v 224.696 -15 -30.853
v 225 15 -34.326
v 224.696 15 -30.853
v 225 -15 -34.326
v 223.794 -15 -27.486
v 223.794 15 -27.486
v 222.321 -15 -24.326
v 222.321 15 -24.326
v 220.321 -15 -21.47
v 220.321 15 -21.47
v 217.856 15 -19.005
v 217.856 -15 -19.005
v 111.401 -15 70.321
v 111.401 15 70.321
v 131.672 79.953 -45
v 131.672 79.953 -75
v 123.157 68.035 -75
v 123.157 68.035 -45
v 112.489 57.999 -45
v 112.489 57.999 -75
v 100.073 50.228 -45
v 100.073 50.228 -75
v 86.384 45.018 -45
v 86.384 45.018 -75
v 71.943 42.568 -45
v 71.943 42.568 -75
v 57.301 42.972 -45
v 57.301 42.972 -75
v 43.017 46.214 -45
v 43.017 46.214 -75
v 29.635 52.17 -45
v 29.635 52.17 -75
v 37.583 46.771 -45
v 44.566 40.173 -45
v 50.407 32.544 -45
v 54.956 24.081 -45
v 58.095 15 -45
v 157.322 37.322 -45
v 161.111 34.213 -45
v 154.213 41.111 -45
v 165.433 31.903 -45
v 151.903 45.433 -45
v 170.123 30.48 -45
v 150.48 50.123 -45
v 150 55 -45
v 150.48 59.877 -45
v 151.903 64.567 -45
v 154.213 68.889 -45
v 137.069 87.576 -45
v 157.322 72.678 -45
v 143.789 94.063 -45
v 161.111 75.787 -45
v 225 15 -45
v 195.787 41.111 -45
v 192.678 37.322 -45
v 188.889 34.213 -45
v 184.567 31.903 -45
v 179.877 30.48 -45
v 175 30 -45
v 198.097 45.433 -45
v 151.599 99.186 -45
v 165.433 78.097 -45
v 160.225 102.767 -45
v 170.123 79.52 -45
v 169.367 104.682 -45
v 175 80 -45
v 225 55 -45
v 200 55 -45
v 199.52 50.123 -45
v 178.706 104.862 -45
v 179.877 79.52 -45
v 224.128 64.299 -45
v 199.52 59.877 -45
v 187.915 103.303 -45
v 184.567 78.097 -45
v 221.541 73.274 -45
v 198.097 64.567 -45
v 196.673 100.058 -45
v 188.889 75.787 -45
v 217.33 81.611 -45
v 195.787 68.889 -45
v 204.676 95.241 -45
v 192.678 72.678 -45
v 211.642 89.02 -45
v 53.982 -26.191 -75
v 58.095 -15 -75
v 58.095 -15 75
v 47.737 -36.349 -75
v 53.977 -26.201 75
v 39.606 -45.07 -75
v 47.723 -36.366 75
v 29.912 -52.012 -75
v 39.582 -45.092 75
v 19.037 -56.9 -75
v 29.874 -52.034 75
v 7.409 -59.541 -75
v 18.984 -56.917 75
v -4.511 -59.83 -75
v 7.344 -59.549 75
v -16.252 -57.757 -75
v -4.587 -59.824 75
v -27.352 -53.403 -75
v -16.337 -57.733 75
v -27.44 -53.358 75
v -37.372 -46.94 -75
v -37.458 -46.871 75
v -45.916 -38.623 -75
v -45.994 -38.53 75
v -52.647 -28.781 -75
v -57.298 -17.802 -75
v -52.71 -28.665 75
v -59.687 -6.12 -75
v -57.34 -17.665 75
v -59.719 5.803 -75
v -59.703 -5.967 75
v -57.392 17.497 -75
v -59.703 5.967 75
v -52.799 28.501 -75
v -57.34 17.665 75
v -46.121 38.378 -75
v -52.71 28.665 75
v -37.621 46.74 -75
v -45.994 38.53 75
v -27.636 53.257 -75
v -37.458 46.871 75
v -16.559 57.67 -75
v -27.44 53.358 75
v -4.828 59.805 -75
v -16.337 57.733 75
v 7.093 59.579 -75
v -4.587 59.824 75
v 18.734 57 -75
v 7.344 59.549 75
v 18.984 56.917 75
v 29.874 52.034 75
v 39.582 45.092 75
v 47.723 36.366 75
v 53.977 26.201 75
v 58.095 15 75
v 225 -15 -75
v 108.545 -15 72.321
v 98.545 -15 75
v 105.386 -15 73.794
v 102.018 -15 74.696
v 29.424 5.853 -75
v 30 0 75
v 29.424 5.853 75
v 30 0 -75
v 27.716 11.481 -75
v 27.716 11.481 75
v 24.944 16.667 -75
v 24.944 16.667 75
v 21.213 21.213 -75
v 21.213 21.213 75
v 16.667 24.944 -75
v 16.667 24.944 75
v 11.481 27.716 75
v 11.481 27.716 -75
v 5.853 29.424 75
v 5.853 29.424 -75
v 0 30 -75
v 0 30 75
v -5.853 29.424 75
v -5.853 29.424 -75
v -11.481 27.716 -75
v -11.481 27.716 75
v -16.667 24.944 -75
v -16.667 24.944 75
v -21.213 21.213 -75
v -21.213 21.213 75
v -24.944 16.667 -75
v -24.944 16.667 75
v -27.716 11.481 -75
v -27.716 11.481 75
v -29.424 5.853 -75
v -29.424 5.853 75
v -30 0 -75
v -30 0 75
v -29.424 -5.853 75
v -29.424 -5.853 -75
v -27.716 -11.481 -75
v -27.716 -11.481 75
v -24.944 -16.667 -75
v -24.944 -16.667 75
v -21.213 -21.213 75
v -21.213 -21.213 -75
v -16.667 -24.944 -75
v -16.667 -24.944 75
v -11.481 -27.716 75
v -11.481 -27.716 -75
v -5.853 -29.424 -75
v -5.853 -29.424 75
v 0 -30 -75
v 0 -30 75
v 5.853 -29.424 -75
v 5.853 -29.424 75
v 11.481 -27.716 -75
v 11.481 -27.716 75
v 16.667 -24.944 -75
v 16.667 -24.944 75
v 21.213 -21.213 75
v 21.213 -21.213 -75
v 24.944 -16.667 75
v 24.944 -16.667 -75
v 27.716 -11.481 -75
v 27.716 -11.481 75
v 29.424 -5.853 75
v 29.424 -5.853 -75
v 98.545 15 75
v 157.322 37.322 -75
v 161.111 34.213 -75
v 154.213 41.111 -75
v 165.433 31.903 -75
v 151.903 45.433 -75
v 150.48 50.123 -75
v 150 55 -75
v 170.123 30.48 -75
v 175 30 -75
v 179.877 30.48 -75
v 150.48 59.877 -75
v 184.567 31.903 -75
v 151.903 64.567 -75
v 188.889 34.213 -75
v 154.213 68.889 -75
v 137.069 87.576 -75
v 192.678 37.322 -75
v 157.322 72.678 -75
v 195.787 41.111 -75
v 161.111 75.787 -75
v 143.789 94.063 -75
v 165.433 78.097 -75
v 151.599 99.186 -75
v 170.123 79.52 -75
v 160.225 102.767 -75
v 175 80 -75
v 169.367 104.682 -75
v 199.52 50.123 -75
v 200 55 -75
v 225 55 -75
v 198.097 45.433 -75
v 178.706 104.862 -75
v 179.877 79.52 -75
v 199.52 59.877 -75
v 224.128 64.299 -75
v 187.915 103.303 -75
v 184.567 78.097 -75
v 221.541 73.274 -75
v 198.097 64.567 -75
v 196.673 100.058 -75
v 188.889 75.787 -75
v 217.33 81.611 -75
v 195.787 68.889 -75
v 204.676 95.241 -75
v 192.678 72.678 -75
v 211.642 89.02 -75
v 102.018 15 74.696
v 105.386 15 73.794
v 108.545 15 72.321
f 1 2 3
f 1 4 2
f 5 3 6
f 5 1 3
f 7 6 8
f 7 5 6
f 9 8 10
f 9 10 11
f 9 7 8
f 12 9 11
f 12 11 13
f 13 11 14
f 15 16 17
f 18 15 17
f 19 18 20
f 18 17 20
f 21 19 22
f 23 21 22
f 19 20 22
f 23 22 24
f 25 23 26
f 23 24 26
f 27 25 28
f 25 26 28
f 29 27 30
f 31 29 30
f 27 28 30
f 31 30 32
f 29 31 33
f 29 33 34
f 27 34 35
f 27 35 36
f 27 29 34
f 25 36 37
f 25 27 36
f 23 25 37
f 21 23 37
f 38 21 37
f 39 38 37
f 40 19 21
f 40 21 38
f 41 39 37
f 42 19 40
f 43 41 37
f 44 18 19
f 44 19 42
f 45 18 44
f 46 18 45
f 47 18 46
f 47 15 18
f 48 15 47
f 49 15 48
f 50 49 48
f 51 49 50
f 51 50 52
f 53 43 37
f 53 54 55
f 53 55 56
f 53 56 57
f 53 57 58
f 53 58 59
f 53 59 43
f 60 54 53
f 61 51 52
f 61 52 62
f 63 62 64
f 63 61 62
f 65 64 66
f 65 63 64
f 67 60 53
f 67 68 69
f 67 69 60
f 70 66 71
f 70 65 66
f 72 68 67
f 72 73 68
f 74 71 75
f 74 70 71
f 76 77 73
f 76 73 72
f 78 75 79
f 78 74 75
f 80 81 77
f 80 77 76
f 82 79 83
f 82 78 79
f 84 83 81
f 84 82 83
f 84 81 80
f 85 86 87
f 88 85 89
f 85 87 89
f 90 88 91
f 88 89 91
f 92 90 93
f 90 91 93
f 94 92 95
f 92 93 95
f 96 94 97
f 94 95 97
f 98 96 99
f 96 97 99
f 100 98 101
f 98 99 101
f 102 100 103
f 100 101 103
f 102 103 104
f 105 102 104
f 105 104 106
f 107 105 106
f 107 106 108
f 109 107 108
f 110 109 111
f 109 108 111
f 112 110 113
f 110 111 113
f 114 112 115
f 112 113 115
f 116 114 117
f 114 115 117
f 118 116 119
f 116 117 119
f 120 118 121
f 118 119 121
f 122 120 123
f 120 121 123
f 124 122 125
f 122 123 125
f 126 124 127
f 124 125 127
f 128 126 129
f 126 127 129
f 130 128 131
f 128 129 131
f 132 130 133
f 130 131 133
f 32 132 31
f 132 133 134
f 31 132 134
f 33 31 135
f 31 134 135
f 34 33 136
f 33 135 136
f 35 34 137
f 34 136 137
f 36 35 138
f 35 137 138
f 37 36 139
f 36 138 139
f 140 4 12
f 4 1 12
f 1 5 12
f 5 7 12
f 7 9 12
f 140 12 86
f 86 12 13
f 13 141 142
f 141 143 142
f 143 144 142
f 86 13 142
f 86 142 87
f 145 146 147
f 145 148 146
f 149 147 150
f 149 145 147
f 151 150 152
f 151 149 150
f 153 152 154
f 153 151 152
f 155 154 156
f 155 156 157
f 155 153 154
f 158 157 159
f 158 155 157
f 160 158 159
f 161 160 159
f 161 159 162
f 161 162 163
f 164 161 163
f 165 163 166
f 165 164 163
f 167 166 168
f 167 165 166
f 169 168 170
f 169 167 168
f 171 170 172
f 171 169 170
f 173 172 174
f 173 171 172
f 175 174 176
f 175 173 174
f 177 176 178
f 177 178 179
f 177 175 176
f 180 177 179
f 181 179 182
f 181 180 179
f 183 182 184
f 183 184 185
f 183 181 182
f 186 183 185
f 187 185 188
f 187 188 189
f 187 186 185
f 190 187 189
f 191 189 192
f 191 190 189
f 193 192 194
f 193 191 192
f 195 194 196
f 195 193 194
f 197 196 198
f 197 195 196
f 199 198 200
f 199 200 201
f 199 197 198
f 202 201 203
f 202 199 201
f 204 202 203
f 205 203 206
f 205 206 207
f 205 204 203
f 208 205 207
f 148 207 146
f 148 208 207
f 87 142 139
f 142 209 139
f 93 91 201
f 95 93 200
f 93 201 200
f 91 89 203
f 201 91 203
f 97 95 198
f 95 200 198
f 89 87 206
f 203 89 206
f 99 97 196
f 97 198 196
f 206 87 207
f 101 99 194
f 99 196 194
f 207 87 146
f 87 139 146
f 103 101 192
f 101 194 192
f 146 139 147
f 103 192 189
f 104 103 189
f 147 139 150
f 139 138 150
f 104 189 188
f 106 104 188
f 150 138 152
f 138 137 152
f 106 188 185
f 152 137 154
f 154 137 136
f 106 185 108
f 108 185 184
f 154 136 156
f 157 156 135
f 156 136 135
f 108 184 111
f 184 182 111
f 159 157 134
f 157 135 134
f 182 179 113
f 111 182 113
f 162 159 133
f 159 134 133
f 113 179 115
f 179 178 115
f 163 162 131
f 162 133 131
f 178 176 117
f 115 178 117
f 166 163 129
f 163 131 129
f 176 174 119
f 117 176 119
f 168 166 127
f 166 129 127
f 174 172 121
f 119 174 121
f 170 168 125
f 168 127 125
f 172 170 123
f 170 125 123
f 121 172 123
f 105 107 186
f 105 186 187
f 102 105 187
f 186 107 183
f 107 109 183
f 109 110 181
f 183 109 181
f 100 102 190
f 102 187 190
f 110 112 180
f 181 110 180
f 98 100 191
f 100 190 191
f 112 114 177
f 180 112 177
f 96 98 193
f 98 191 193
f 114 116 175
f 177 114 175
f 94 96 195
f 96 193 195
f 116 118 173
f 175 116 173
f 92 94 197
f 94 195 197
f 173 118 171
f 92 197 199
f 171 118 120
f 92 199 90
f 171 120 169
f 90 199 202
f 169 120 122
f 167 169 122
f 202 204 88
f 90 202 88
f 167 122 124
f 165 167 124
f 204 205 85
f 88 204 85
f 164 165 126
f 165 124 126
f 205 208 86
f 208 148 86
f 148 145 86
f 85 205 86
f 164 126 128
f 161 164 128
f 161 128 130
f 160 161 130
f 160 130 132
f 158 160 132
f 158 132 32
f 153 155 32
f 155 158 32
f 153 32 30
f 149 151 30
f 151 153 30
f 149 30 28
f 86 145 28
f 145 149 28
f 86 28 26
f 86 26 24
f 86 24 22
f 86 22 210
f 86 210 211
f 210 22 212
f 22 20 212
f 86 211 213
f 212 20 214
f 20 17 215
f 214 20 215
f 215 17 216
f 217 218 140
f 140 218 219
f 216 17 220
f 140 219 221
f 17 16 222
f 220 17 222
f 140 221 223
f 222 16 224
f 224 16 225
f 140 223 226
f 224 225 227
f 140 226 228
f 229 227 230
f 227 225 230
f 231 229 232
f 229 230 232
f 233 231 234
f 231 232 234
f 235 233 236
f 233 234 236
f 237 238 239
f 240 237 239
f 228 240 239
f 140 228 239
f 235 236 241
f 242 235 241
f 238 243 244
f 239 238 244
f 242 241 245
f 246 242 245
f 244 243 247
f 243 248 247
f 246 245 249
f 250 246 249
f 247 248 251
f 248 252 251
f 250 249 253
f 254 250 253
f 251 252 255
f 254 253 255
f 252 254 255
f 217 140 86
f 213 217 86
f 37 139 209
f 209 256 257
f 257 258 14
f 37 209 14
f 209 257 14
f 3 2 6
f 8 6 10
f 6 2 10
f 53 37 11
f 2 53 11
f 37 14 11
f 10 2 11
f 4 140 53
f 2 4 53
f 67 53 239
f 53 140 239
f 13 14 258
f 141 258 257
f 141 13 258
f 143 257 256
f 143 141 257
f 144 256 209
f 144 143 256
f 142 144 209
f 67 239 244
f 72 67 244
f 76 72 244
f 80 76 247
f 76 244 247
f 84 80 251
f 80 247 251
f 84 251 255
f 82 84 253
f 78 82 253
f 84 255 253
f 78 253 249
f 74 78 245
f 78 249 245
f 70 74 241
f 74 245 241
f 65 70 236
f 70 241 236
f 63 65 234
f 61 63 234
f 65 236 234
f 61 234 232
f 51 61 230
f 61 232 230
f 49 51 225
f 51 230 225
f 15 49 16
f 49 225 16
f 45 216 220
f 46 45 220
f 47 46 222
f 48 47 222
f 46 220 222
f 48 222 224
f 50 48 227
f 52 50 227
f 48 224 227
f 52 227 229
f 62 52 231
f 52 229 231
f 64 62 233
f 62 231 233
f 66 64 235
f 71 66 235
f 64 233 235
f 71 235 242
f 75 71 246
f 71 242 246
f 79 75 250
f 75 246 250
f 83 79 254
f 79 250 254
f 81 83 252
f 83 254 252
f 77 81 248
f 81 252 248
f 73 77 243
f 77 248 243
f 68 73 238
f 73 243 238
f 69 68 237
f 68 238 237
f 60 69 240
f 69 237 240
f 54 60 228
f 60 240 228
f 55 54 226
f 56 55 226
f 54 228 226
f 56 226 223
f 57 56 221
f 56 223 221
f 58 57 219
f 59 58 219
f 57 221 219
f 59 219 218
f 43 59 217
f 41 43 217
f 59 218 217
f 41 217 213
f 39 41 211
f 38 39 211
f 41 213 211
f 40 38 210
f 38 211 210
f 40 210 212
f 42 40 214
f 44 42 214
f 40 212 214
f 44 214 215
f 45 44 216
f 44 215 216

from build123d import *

# Parameters (mm, degrees)
SKETCH1_R           = 30
BOSS_EXTRUDE1_DEPTH = 75
SKETCH2_R           = 25
BOSS_EXTRUDE2_DEPTH = 30
CUT_EXTRUDE1_DEPTH  = 76
FILLET1_R           = 20


with BuildPart() as part:
    # Sketch1 → Boss-Extrude1 (new body, symmetric)
    with BuildSketch(Plane.XY):
        with BuildLine():
            Line((58.094750193, 15), (225, 15))
            Line((225, 15), (225, -15))
            Line((225, -15), (58.094750193, -15))
            ThreePointArc((58.094750193, -15), (-60, 0), (58.094750193, 15))
        make_face()
        Circle(SKETCH1_R, mode=Mode.SUBTRACT)
    extrude(amount=BOSS_EXTRUDE1_DEPTH, both=True)

    # Sketch2 → Boss-Extrude2 (add)
    with BuildSketch(Plane(origin=(0, 0, -75), x_dir=(-1, 0, 0), z_dir=(0, 0, -1))):
        with BuildLine():
            Line((-225, 15), (-225, 55))
            ThreePointArc((-225, 55), (-187.914926762, 103.30325731), (-131.671813331, 79.953321221))
            ThreePointArc((-131.671813331, 79.953321221), (-86.383524737, 45.01789196), (-29.635348145, 52.170356912))
            ThreePointArc((-29.635348145, 52.170356912), (-47.639808951, 36.475314984), (-58.094750193, 15))
            Line((-58.094750193, 15), (-225, 15))
        make_face()
        with Locations((-175, 55)):
            Circle(SKETCH2_R, mode=Mode.SUBTRACT)
    extrude(amount=-BOSS_EXTRUDE2_DEPTH)

    # Sketch3 → Cut-Extrude1 (cut, through all)
    with BuildSketch(Plane(origin=(0, 15, 0), x_dir=(1, 0, 0), z_dir=(0, 1, 0))):
        Polygon((225, 25), (105.824640741, -75), (225, -75), align=None)
    extrude(amount=-CUT_EXTRUDE1_DEPTH, mode=Mode.SUBTRACT)

    # Fillet1
    fillet1_edges = [part.edges().sort_by_distance(p)[0] for p in [
        (225, 0, -25),
        (105.824640741, 0, 75),
    ]]
    fillet(fillet1_edges, radius=FILLET1_R)


solid = part.part
